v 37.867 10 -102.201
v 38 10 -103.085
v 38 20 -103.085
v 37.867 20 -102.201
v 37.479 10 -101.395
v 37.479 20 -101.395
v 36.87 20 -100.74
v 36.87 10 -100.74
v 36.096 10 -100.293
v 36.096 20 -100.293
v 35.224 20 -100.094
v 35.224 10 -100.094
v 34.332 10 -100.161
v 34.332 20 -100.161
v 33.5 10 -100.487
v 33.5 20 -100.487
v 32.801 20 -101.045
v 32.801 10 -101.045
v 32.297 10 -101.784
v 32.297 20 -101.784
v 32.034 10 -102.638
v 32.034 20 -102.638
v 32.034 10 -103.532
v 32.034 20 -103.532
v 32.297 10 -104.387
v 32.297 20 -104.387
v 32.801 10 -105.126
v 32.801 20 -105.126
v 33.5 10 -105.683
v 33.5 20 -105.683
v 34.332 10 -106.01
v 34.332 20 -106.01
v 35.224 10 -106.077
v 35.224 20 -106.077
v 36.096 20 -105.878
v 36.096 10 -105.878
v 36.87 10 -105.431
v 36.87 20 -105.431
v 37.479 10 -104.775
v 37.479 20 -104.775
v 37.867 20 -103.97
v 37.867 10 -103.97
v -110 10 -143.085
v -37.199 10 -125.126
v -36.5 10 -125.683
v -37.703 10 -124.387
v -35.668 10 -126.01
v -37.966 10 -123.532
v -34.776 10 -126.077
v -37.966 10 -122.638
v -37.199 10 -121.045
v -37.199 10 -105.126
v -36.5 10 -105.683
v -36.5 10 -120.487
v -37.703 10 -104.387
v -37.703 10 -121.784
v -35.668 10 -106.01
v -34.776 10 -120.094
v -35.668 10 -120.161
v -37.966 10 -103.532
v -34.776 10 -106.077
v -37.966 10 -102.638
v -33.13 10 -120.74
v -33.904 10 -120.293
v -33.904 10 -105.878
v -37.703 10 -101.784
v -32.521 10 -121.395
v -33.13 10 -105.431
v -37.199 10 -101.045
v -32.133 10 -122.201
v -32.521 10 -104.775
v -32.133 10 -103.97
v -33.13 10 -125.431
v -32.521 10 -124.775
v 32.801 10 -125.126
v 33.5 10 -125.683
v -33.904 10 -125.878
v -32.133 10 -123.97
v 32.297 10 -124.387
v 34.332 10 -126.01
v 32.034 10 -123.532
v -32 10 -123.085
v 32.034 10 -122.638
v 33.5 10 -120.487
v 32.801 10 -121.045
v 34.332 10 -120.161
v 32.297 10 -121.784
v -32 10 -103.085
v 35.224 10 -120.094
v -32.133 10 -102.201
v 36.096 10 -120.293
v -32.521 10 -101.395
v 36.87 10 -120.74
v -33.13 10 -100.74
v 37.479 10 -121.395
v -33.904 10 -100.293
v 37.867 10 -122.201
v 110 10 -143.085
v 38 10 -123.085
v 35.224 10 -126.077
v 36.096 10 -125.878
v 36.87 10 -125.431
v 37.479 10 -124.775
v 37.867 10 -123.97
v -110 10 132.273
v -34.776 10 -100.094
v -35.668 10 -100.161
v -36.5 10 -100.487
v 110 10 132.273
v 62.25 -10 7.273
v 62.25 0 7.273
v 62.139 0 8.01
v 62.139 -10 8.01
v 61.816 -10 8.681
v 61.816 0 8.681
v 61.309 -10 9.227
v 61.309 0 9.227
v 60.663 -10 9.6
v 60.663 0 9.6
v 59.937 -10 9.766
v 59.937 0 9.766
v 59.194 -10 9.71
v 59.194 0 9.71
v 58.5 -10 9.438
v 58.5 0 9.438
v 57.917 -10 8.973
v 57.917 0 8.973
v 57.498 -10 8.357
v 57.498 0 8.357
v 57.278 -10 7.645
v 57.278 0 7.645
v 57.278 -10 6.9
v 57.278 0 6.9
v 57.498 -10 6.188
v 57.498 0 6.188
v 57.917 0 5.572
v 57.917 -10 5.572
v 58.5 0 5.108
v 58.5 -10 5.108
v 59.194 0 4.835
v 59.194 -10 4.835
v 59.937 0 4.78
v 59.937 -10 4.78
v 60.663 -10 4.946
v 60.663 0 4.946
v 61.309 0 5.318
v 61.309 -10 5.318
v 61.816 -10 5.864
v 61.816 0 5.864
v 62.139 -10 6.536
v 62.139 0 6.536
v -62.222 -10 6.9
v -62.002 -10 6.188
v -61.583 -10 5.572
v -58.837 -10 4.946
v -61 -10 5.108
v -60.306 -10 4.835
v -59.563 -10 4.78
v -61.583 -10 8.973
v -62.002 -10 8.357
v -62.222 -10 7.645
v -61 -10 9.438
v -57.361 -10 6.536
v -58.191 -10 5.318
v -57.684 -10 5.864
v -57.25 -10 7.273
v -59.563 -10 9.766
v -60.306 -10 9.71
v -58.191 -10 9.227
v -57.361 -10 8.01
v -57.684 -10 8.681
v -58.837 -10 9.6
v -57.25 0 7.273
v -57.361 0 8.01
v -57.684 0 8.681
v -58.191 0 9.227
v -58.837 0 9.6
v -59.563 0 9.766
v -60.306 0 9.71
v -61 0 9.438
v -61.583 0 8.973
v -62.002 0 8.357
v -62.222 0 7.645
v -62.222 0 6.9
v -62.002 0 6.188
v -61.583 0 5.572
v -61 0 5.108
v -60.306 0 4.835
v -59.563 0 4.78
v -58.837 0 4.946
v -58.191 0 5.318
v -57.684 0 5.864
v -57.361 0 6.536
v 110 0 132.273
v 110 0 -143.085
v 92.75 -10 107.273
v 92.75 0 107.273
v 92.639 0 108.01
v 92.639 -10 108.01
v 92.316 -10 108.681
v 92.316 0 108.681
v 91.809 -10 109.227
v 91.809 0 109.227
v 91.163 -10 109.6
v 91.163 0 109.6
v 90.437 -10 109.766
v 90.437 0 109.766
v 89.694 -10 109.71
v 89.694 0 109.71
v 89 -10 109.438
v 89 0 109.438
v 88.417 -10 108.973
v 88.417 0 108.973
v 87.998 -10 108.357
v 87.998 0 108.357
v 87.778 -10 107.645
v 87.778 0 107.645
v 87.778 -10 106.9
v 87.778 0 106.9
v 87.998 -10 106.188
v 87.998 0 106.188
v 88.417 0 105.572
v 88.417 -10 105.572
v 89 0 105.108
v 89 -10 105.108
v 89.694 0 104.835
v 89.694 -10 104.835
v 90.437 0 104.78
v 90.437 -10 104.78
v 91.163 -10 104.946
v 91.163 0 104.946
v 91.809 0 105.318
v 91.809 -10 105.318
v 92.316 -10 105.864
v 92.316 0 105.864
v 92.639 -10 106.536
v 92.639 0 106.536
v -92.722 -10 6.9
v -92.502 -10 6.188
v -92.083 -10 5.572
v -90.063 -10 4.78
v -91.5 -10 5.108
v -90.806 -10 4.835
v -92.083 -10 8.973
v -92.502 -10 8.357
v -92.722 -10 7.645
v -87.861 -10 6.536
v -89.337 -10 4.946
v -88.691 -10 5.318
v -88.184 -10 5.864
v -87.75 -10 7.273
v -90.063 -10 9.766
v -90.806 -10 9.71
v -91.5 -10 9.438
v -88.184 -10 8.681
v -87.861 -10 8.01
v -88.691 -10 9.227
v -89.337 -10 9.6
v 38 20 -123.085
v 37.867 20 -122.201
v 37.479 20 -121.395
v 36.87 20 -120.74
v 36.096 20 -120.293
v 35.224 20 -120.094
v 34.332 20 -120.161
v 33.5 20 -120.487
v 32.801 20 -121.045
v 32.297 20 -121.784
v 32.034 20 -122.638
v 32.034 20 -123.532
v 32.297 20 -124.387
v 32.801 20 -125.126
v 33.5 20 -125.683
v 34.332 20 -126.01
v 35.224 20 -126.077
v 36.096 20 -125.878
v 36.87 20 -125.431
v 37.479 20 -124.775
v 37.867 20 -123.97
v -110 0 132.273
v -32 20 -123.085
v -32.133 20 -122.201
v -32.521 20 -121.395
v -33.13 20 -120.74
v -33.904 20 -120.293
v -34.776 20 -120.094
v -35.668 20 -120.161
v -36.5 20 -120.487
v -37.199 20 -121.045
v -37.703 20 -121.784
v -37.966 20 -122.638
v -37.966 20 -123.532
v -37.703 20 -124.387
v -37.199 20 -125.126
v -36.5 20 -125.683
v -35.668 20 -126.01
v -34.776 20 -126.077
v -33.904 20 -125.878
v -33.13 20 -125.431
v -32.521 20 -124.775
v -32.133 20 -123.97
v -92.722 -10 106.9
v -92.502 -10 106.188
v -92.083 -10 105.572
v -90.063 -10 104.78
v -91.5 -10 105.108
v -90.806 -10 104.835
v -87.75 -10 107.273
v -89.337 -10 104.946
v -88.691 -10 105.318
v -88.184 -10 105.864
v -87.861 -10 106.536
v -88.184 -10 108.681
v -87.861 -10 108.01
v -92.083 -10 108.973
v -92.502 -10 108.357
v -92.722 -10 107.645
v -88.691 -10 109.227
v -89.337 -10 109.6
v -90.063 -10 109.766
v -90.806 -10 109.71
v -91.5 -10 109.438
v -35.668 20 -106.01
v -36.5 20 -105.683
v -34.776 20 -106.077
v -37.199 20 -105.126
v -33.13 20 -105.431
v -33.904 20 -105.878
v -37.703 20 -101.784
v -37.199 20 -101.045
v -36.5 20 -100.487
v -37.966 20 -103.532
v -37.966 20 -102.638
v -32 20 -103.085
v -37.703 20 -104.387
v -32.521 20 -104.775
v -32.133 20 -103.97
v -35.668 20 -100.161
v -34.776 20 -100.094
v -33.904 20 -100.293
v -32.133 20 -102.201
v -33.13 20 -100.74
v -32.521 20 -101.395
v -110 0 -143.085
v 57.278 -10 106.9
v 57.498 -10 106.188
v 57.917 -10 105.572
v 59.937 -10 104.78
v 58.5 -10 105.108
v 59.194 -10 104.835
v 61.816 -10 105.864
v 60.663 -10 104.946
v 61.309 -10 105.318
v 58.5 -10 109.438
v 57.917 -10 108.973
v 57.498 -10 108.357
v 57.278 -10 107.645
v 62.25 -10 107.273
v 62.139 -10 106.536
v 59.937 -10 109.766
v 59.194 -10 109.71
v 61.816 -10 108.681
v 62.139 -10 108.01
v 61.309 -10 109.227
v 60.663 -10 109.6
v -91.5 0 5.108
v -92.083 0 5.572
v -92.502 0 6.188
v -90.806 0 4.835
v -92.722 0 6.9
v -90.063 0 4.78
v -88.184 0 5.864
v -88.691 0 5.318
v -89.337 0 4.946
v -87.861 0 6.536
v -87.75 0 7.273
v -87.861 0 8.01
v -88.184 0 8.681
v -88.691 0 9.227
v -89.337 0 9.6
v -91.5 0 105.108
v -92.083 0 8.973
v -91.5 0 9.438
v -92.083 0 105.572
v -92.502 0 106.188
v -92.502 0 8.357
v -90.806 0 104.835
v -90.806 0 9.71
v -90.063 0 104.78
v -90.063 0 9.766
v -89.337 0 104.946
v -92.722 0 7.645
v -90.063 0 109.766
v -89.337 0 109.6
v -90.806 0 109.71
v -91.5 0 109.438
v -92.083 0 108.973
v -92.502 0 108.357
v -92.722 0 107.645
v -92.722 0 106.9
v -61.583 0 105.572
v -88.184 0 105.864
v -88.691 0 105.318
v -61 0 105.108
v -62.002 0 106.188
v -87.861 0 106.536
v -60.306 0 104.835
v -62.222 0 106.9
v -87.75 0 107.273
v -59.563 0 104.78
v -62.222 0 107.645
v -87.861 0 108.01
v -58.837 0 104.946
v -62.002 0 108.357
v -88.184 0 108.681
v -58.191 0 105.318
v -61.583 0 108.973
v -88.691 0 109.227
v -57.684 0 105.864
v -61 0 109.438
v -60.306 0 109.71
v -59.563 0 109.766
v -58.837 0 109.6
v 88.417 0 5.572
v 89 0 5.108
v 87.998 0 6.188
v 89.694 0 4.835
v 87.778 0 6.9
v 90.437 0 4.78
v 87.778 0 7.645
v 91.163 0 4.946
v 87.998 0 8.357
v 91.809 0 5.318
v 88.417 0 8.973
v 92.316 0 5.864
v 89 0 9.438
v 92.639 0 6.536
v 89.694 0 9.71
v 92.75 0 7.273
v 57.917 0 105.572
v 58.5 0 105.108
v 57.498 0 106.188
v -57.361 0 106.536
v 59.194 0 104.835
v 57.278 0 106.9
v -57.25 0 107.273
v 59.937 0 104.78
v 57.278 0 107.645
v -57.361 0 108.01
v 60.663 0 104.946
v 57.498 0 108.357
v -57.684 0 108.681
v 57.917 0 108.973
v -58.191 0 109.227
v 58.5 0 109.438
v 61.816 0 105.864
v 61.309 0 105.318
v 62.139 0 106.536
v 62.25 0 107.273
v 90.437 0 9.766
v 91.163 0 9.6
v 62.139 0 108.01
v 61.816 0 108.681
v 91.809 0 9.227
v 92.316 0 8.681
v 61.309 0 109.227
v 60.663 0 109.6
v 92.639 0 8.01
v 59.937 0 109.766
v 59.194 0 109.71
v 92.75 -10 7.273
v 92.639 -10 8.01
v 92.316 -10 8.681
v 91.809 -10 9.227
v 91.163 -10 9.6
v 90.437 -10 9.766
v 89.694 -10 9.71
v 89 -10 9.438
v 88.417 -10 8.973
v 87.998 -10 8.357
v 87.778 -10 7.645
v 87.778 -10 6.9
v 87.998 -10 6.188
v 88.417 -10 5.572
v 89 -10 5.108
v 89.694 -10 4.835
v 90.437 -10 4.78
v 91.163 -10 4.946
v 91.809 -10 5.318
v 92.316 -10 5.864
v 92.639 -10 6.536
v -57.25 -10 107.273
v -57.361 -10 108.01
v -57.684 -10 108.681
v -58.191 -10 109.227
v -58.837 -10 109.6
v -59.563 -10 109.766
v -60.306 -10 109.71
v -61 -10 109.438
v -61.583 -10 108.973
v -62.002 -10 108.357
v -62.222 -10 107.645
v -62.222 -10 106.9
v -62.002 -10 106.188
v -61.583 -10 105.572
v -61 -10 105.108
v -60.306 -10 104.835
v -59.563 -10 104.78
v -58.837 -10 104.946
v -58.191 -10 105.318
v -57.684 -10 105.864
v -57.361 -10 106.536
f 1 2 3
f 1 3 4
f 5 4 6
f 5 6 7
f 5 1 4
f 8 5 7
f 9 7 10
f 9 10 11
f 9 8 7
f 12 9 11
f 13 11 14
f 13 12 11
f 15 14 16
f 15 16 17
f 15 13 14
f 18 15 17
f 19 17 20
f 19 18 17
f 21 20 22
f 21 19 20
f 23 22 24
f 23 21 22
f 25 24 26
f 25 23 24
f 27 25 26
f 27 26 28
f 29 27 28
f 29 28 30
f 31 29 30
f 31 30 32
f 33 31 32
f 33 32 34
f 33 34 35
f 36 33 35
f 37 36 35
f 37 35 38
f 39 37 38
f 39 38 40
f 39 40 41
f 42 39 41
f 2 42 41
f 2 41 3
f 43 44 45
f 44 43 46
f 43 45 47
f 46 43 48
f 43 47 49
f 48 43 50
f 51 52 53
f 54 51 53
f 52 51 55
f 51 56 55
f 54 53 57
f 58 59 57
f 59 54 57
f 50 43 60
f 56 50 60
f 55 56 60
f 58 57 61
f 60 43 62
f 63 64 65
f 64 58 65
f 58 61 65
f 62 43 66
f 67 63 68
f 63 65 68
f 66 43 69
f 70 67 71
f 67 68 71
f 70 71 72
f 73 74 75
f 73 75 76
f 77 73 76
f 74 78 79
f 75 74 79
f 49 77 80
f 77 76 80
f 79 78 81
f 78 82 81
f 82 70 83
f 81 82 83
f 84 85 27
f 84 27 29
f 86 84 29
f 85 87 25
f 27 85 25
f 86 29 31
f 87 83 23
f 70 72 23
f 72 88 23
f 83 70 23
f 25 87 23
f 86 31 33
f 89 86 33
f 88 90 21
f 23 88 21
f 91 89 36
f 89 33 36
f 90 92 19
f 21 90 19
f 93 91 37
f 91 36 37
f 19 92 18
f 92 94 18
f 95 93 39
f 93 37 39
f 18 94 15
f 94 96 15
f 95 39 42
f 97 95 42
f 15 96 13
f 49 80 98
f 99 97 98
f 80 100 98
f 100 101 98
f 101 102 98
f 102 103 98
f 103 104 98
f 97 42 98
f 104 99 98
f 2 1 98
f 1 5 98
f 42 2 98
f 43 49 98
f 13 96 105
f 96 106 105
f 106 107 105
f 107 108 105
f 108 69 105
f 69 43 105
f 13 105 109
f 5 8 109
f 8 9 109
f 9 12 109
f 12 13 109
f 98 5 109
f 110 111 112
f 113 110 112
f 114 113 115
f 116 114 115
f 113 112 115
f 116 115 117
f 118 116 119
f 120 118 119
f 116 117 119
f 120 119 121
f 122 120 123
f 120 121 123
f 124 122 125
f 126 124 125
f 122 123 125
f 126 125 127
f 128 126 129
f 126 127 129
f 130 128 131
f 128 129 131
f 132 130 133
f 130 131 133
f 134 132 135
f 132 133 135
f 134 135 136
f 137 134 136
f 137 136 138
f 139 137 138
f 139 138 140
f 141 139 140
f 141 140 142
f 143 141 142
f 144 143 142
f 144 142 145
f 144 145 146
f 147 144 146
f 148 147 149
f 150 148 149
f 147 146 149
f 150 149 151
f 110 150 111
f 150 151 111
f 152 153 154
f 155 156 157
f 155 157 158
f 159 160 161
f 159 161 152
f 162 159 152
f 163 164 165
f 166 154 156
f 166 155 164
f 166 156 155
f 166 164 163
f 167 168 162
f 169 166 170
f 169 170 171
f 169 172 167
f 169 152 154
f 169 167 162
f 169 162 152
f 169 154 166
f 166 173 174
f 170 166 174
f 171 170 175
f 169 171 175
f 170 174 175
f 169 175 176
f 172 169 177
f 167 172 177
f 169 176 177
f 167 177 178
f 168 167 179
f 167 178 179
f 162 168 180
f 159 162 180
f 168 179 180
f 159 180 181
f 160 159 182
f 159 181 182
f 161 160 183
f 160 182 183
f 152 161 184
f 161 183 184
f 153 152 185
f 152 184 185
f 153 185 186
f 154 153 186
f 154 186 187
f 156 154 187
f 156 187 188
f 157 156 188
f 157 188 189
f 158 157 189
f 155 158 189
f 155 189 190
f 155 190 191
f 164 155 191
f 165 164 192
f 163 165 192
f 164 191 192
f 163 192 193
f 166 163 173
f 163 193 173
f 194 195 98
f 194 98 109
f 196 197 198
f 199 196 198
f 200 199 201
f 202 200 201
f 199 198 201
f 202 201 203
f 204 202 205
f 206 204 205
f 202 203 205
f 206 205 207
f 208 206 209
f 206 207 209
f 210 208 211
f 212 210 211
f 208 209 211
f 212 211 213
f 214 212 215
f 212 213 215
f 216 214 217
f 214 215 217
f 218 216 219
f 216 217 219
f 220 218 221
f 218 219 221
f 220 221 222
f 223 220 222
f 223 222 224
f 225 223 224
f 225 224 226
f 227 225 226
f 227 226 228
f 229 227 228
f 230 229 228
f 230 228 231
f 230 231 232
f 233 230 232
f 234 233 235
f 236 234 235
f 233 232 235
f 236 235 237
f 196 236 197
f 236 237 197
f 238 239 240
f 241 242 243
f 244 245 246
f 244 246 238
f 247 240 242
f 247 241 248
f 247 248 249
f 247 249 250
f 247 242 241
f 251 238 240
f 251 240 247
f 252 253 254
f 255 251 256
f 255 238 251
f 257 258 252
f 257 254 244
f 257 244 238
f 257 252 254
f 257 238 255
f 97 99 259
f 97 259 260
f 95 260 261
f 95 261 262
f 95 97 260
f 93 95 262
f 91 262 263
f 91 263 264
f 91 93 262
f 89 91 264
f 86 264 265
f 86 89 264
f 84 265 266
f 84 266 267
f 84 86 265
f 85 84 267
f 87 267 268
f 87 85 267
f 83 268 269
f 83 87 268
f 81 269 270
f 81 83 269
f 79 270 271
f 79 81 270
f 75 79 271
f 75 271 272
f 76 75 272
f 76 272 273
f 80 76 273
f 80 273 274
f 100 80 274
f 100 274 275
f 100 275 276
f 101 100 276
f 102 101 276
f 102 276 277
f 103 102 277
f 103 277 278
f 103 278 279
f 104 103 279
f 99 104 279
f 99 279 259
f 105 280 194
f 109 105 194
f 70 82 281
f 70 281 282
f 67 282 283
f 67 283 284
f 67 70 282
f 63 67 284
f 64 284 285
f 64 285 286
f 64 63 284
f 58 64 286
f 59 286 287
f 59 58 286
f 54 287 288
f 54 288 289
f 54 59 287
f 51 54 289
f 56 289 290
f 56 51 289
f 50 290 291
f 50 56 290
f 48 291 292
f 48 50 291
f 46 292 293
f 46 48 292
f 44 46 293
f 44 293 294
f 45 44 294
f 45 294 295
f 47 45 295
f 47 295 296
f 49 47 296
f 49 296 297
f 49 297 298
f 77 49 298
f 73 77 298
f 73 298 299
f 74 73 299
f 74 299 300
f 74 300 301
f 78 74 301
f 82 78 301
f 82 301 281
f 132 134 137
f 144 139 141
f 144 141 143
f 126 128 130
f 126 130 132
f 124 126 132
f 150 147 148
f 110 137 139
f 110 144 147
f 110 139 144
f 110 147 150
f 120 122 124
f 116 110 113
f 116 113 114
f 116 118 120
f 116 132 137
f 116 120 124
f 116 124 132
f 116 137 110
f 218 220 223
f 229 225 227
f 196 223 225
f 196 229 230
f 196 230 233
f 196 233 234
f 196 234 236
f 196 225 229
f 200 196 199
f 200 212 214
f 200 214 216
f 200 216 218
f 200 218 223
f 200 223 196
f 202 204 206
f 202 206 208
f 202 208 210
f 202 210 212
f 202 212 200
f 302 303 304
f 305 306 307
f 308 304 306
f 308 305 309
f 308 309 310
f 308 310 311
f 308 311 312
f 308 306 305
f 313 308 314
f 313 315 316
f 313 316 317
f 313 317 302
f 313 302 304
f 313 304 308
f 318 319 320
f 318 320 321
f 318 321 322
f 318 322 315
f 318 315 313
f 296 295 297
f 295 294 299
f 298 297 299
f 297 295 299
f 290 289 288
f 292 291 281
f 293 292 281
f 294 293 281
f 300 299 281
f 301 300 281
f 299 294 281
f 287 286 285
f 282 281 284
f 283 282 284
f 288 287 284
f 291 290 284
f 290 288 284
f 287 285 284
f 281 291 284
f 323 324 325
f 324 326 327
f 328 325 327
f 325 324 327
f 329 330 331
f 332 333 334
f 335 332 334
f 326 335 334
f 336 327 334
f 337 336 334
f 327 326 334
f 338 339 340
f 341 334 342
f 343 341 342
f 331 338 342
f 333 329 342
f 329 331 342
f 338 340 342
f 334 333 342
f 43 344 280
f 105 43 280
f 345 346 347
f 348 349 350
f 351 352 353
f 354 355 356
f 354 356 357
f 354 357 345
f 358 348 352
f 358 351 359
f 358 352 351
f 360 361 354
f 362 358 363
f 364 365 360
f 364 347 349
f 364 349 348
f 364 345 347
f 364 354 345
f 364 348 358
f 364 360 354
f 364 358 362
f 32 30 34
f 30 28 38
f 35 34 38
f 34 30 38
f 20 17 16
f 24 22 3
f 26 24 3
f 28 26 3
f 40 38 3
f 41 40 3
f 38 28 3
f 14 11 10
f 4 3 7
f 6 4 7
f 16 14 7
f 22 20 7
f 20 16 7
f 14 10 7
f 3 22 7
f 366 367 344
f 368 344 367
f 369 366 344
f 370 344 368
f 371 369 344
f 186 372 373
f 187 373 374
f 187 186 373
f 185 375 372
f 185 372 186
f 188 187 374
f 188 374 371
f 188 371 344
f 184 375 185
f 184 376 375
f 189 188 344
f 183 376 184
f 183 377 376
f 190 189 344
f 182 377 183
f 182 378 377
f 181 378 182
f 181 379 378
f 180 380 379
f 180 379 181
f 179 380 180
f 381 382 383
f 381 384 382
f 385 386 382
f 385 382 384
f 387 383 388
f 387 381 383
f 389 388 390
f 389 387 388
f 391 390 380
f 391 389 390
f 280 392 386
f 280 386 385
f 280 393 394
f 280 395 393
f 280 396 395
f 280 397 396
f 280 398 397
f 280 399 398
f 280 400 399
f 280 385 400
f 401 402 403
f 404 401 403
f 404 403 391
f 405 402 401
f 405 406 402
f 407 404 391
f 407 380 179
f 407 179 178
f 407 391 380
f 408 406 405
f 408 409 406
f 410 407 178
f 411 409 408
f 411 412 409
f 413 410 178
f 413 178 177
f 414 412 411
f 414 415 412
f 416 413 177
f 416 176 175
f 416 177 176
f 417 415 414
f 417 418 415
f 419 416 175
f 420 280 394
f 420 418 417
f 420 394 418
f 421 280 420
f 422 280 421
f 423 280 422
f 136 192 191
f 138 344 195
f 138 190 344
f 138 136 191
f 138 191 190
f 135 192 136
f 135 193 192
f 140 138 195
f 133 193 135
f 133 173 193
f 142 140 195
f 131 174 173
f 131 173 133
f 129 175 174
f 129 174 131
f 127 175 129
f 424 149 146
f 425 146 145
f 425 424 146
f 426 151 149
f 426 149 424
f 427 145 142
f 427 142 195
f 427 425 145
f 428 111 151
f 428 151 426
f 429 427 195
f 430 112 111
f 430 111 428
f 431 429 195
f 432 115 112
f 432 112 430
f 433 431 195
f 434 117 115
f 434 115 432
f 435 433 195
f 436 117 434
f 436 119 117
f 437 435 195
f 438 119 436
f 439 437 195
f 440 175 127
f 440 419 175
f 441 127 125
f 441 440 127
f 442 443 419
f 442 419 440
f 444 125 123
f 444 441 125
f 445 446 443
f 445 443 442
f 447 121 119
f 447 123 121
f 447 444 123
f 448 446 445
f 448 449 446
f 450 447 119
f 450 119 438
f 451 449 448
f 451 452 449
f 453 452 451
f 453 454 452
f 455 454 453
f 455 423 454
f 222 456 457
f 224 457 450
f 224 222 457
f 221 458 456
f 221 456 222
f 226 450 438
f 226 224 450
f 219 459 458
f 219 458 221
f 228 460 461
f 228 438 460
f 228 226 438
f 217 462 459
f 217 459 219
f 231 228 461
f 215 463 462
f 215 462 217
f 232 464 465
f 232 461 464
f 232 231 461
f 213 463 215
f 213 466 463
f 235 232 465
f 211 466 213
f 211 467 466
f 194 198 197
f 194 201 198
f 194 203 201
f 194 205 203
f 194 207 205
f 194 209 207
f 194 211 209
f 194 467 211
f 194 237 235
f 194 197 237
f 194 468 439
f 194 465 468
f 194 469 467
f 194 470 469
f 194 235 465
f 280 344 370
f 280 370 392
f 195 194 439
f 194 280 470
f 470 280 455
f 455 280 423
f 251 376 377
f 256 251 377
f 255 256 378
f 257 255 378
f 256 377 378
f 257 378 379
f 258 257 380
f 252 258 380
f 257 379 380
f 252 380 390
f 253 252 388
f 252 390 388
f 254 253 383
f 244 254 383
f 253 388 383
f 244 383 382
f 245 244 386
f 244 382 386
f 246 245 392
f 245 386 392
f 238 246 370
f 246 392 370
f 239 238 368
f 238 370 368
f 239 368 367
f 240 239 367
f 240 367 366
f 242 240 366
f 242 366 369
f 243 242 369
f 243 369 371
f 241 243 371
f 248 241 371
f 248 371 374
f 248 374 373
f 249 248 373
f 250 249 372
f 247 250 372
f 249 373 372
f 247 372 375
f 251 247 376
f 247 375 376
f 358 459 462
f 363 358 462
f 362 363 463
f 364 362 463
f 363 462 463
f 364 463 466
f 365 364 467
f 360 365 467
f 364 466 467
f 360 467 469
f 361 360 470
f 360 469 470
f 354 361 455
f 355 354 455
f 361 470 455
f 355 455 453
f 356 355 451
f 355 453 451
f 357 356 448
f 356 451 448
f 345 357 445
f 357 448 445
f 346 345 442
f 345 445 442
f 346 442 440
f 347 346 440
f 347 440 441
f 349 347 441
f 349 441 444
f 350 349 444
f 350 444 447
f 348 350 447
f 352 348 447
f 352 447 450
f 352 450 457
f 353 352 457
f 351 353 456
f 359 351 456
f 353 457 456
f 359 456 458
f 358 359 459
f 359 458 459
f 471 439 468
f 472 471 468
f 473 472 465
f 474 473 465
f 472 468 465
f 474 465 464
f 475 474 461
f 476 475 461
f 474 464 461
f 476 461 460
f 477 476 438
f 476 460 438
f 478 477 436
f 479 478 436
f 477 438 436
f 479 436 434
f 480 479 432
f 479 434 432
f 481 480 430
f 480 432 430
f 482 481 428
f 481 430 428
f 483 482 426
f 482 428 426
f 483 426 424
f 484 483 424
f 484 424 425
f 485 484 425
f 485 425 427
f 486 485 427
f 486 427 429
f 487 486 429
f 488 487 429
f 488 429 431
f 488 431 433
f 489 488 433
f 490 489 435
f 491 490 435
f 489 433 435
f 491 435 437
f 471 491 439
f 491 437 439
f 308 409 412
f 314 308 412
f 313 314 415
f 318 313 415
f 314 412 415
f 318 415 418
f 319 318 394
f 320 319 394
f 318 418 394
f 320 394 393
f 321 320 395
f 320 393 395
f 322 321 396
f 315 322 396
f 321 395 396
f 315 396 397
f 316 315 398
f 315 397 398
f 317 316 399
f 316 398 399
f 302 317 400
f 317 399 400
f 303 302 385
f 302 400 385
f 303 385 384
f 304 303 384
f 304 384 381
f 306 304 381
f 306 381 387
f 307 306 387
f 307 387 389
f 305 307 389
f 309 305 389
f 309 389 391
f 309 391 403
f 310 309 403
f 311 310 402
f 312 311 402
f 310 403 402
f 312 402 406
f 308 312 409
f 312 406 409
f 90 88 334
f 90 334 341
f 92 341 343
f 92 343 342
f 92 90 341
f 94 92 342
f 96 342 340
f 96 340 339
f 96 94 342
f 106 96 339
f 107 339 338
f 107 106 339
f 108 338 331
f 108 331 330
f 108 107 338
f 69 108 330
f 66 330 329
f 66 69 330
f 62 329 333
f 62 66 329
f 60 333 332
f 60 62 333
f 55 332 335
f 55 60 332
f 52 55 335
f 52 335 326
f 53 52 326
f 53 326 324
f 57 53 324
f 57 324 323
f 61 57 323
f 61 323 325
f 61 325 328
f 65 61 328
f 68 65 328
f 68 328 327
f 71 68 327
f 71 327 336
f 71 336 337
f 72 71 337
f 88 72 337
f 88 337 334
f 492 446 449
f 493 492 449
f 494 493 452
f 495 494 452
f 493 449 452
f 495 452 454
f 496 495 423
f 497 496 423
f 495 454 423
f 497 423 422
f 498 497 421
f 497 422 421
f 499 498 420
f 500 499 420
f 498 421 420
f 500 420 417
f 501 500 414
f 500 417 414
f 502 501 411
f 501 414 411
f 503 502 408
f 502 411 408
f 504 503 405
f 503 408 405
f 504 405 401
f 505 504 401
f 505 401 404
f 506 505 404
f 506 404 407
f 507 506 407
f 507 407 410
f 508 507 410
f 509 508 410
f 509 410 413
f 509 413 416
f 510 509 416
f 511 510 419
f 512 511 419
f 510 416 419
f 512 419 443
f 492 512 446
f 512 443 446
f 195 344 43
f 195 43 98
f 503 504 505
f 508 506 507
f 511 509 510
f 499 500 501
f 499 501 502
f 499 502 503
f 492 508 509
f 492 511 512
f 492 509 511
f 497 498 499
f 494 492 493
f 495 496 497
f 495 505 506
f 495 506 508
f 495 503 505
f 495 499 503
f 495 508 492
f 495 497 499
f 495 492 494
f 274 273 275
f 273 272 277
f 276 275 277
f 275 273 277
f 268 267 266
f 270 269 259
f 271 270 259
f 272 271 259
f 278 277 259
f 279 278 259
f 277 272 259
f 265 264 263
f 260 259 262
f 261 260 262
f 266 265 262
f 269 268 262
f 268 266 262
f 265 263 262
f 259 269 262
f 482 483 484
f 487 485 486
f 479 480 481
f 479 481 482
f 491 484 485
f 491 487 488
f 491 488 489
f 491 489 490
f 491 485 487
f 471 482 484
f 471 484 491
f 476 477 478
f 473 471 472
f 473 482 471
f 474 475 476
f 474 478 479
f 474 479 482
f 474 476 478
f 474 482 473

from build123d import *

# Parameters (mm, degrees)
F0_W     = 220
F0_H     = 275.358058
F0_R     = 2.5
F1_DEPTH = 10
F2_DEPTH = 10
F3_R     = 3
F4_DEPTH = 20


with BuildPart() as f1:
    # F0 (on Front) → F1 (new body)
    with BuildSketch(Plane.XZ):
        with Locations((0, -5.406313)):
            Rectangle(F0_W, F0_H)
        with Locations((-90.25, 7.272716)):
            Circle(F0_R, mode=Mode.SUBTRACT)
        with Locations((-59.75, 7.272716)):
            Circle(F0_R, mode=Mode.SUBTRACT)
        with Locations((-90.25, 107.272716)):
            Circle(F0_R, mode=Mode.SUBTRACT)
        with Locations((-59.75, 107.272716)):
            Circle(F0_R, mode=Mode.SUBTRACT)
        with Locations((59.75, 7.272716)):
            Circle(F0_R, mode=Mode.SUBTRACT)
        with Locations((90.25, 7.272716)):
            Circle(F0_R, mode=Mode.SUBTRACT)
        with Locations((59.75, 107.272716)):
            Circle(F0_R, mode=Mode.SUBTRACT)
        with Locations((90.25, 107.272716)):
            Circle(F0_R, mode=Mode.SUBTRACT)
        with Locations((-90.25, 107.272716)):
            Circle(F0_R)
        with Locations((-59.75, 107.272716)):
            Circle(F0_R)
        with Locations((-90.25, 7.272716)):
            Circle(F0_R)
        with Locations((-59.75, 7.272716)):
            Circle(F0_R)
        with Locations((59.75, 7.272716)):
            Circle(F0_R)
        with Locations((90.25, 7.272716)):
            Circle(F0_R)
        with Locations((59.75, 107.272716)):
            Circle(F0_R)
        with Locations((90.25, 107.272716)):
            Circle(F0_R)
    extrude(amount=-F1_DEPTH)

    # F0 (on Front) → F2 (join)
    with BuildSketch(Plane.XZ):
        with Locations((90.25, 107.272716)):
            Circle(F0_R)
        with Locations((59.75, 107.272716)):
            Circle(F0_R)
        with Locations((-59.75, 107.272716)):
            Circle(F0_R)
        with Locations((-90.25, 107.272716)):
            Circle(F0_R)
        with Locations((90.25, 7.272716)):
            Circle(F0_R)
        with Locations((59.75, 7.272716)):
            Circle(F0_R)
        with Locations((-90.25, 7.272716)):
            Circle(F0_R)
        with Locations((-59.75, 7.272716)):
            Circle(F0_R)
    extrude(amount=F2_DEPTH)

    # F3 (on face) → F4 (join)
    with BuildSketch(Plane.XZ):
        with Locations((35, -103.085342)):
            Circle(F3_R)
        with Locations((35, -123.085342)):
            Circle(F3_R)
        with Locations((-35, -123.085342)):
            Circle(F3_R)
        with Locations((-35, -103.085342)):
            Circle(F3_R)
    extrude(amount=-F4_DEPTH)


solid = f1.part
